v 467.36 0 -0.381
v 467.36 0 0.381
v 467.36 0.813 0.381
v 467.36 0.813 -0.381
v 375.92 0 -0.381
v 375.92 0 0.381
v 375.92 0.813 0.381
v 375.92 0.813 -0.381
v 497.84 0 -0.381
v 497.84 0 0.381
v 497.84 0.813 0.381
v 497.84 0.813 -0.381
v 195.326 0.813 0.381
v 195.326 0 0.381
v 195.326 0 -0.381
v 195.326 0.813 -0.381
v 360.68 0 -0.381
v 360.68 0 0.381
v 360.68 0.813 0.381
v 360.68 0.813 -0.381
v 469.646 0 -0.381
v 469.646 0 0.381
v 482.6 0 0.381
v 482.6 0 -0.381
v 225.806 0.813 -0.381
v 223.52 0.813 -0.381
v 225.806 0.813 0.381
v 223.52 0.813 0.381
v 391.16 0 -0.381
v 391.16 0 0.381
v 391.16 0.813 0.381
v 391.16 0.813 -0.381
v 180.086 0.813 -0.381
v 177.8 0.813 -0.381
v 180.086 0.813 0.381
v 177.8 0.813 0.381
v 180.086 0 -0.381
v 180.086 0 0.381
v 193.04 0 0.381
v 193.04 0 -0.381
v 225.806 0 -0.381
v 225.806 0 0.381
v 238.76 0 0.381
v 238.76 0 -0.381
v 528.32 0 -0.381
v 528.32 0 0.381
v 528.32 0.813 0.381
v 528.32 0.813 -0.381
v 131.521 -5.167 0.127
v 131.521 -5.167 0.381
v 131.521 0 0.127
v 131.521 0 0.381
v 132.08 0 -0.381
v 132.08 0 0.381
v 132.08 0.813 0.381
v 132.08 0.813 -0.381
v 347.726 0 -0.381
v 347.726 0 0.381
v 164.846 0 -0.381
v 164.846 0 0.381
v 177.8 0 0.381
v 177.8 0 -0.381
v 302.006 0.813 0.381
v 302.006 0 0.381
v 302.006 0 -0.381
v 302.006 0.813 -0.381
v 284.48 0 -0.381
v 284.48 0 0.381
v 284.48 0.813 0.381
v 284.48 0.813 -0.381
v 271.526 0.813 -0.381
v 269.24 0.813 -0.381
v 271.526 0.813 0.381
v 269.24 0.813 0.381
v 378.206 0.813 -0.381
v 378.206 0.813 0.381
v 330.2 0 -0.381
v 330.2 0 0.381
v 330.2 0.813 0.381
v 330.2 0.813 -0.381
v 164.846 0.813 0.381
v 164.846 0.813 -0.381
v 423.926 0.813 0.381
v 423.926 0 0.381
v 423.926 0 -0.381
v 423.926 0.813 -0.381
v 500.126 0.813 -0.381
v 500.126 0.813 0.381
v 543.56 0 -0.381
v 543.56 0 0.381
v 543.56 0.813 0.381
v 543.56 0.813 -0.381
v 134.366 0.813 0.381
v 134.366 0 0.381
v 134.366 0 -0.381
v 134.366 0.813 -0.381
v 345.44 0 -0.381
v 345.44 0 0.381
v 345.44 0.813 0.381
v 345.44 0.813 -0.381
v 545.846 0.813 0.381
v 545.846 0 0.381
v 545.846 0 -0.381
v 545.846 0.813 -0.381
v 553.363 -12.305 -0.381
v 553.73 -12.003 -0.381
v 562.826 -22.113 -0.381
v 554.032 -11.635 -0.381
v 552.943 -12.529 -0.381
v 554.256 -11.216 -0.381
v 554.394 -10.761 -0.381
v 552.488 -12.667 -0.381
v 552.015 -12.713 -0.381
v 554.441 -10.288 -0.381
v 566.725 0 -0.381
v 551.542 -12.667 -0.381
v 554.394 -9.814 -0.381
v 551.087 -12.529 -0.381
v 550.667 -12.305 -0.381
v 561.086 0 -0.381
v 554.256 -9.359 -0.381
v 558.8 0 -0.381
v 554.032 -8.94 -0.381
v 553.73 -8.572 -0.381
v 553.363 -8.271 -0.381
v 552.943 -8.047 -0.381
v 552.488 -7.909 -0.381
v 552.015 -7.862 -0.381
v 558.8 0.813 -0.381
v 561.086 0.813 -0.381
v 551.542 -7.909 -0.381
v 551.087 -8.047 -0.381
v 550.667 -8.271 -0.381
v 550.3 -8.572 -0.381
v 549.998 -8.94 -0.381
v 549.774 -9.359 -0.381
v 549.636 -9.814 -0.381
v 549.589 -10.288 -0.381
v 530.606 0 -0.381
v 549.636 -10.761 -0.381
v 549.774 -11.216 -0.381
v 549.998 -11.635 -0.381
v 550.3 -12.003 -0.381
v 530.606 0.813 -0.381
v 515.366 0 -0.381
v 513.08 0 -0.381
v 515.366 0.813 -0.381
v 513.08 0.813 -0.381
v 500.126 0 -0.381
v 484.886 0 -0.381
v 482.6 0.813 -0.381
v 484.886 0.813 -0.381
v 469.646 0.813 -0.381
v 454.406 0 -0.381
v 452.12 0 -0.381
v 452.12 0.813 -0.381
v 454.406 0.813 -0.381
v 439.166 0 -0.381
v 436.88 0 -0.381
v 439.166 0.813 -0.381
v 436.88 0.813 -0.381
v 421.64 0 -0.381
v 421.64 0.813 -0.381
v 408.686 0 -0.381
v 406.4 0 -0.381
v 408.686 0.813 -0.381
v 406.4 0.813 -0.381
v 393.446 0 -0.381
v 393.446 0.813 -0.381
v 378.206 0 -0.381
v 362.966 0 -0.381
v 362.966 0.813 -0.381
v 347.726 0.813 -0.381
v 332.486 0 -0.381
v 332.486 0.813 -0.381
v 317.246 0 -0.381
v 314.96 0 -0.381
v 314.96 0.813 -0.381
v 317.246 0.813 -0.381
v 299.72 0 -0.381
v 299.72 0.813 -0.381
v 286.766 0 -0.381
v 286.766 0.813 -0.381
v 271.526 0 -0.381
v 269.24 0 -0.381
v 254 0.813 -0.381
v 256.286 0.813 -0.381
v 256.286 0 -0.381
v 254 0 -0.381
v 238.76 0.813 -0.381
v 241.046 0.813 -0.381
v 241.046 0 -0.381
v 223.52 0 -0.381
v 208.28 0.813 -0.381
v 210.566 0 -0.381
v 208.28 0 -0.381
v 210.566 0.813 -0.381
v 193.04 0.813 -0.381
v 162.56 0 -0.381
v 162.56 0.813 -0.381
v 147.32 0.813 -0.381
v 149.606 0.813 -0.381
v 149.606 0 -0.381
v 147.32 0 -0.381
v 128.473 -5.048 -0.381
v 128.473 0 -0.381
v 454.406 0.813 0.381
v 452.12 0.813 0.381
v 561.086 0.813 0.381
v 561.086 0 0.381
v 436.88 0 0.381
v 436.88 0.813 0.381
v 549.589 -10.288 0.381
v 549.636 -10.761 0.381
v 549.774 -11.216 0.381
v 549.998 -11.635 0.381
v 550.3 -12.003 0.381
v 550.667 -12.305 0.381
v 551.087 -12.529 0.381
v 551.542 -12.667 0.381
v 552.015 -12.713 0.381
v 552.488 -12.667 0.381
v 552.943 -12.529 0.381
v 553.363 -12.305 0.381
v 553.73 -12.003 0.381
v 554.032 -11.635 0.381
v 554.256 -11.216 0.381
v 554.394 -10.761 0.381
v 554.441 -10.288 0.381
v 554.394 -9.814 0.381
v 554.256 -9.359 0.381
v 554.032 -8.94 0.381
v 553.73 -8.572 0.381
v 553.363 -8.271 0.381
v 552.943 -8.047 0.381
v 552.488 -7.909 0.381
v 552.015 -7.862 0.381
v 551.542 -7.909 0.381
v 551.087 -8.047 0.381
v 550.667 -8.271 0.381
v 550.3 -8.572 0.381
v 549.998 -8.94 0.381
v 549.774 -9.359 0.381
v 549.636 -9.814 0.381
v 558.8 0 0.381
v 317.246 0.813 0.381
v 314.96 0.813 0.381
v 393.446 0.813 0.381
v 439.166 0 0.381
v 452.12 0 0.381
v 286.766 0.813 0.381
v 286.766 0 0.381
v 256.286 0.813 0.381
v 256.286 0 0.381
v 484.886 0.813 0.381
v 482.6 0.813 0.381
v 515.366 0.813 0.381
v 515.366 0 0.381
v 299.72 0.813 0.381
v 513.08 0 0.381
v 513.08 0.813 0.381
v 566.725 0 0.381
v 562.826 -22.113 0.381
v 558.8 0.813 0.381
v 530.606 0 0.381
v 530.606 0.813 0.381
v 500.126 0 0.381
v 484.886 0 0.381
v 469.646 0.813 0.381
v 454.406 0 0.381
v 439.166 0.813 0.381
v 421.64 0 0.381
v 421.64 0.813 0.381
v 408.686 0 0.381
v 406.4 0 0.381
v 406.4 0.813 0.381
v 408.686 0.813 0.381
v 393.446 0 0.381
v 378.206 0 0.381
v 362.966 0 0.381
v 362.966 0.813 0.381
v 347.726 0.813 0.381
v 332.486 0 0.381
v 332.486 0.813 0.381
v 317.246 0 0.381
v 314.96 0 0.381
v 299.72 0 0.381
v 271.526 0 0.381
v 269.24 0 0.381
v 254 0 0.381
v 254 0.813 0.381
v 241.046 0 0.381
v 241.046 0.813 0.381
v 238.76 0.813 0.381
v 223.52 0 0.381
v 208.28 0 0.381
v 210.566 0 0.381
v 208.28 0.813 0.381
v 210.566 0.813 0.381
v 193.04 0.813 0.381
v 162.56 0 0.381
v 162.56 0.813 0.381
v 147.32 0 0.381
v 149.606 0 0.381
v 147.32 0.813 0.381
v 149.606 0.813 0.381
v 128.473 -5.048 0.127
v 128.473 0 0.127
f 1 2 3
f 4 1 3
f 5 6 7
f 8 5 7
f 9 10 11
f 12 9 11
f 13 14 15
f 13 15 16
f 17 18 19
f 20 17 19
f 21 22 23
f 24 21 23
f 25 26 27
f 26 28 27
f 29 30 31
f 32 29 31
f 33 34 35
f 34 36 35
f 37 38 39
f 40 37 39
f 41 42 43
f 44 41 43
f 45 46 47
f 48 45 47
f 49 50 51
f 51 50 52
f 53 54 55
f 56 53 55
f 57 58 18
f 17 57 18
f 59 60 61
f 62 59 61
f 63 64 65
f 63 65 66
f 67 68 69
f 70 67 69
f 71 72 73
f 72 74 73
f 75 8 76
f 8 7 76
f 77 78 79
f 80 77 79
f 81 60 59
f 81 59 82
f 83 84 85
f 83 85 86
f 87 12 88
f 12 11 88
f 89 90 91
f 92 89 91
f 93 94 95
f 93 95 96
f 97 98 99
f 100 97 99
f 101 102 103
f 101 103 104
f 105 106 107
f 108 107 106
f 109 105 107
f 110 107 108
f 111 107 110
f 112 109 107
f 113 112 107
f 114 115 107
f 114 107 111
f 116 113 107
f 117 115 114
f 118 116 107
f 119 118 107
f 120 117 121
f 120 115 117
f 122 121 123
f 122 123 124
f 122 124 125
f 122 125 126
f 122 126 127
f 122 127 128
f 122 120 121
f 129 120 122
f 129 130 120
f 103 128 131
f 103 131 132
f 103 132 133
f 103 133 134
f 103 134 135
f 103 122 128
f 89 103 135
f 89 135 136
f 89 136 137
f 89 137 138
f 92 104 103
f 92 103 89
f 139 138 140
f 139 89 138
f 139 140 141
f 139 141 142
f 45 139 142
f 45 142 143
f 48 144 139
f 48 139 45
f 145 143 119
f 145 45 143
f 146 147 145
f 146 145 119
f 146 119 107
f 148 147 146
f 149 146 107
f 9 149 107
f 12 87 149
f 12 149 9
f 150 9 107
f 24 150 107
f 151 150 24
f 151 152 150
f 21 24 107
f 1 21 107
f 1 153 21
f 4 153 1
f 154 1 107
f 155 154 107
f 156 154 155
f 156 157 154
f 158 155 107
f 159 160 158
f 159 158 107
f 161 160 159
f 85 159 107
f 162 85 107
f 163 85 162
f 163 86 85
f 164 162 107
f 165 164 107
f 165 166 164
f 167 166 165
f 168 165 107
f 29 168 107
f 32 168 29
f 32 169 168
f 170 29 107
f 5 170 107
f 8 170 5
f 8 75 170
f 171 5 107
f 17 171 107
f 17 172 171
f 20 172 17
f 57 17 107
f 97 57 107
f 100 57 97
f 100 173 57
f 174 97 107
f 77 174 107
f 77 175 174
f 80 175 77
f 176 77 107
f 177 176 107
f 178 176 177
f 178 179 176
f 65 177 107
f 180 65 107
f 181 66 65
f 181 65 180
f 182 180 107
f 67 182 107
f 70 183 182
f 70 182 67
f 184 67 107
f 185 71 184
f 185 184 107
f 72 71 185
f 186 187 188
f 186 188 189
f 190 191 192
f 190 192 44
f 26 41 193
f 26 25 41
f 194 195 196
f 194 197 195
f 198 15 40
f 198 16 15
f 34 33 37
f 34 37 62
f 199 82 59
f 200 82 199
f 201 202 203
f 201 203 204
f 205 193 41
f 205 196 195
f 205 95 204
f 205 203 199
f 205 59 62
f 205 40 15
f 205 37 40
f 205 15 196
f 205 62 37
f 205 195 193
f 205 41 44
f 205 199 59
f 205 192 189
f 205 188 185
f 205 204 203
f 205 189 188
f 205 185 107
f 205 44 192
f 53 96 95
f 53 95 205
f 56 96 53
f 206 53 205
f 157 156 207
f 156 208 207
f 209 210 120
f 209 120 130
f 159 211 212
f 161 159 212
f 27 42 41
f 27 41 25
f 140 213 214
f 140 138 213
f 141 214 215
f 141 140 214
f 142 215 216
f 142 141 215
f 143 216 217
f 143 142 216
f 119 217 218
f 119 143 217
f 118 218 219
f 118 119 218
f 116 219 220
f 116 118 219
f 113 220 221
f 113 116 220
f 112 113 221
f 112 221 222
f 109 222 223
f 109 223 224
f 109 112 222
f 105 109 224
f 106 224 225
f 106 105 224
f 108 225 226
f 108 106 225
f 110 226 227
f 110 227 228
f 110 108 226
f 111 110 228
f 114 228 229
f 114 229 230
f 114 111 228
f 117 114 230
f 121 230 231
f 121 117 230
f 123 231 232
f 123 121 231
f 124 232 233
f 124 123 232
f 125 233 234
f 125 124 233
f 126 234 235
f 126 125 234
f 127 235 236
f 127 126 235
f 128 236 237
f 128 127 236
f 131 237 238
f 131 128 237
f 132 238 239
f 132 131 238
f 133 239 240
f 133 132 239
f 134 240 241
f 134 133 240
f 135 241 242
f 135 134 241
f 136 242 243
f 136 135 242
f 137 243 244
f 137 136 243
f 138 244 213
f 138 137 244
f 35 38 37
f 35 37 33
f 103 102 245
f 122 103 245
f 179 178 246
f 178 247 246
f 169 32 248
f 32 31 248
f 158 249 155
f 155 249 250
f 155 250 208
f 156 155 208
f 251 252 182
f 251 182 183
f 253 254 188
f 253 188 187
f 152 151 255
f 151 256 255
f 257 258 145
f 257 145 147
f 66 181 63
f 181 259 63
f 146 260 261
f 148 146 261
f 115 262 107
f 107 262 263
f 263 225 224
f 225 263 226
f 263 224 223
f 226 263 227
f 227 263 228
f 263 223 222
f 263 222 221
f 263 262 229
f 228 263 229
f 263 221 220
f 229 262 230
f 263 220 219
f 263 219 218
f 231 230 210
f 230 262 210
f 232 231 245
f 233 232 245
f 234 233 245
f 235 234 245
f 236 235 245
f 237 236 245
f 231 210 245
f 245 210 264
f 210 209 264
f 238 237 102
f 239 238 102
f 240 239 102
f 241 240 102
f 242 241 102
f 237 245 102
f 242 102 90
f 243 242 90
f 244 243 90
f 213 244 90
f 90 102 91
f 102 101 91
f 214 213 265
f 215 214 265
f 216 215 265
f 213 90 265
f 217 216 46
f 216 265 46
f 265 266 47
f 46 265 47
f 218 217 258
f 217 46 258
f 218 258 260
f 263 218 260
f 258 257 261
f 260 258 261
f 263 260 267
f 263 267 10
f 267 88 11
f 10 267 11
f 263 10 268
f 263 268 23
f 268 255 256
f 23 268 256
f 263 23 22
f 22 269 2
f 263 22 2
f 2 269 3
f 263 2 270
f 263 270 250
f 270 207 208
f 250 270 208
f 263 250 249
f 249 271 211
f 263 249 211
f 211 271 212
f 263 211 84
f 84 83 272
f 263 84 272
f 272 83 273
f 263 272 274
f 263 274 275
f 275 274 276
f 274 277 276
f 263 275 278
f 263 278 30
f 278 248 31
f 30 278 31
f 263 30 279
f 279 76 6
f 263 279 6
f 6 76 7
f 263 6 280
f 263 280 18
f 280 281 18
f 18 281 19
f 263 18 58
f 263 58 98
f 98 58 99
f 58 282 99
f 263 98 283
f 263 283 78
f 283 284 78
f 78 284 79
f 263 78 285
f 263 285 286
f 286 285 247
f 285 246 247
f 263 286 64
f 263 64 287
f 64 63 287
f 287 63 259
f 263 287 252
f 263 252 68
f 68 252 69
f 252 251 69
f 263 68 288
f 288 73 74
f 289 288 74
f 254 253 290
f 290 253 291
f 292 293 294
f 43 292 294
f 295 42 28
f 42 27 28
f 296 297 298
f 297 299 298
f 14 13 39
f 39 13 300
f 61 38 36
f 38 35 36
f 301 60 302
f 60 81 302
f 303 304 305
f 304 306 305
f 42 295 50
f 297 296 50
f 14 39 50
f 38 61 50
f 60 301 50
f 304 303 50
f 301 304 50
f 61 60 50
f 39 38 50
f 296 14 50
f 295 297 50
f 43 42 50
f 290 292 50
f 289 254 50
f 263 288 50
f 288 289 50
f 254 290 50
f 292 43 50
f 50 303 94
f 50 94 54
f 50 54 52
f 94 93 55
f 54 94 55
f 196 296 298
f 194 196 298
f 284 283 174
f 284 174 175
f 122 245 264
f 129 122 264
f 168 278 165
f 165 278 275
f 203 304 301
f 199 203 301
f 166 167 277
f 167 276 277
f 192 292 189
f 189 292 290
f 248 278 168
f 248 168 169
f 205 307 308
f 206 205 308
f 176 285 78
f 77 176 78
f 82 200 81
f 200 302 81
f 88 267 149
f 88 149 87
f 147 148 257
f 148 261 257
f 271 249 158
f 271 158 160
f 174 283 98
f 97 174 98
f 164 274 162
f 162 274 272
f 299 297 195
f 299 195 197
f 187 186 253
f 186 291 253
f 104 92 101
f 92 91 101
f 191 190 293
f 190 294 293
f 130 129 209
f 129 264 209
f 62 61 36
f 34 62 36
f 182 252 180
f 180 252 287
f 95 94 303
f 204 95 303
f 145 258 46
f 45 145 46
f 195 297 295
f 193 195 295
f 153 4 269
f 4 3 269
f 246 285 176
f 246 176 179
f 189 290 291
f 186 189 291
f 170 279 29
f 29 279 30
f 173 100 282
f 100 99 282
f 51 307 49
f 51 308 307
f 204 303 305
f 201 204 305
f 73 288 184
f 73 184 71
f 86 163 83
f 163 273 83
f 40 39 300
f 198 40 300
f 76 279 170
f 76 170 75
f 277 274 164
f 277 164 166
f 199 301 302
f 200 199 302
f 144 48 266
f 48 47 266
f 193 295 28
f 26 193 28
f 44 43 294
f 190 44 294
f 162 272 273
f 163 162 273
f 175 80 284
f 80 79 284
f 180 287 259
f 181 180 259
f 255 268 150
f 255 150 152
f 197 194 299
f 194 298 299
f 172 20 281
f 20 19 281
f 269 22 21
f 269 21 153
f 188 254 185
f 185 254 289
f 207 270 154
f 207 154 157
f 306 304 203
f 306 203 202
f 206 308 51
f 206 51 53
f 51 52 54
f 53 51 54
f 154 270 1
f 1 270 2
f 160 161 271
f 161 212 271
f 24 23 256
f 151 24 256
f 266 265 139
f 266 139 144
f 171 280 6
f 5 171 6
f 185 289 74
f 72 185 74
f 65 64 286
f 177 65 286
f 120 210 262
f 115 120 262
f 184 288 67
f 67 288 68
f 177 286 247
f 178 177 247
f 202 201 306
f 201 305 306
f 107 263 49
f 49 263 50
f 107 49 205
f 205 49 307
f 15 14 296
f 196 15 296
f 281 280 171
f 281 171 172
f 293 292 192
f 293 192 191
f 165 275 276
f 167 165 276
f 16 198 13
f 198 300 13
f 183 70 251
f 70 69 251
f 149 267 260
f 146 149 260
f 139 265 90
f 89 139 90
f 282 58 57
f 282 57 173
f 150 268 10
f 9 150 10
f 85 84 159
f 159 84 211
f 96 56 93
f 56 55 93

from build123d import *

# Parameters (mm, degrees)
SKETCH1_R                      = 2.4257
EXTRUDE1_DEPTH                 = 0.381
SKETCH2_W                      = 2.286
SKETCH2_H                      = 1.0668
EB_02_TAB_1_DEPTH              = 0.381
LP_01_TAB_1_X_29_X_0_600_COUNT = 29
LP_01_TAB_1_X_29_X_0_600_PITCH = 15.24
SKETCH5_W                      = 6.469789446
SKETCH5_H                      = 8.753244544
EXTRUDE5_DEPTH                 = 0.254


with BuildPart() as part:
    # Sketch1 → Extrude1 (new, symmetric)
    with BuildSketch(Plane.XY):
        Polygon((128.4732, 0), (566.7248, 0), (562.825597202, -22.113477941), (128.4732, -5.047725776), align=None)
        with Locations((552.014887855, -10.287672178)):
            Circle(SKETCH1_R, mode=Mode.SUBTRACT)
    extrude(amount=EXTRUDE1_DEPTH, both=True)

    # Sketch2 → EB-02 Tab 1 (add, symmetric)
    with BuildSketch(Plane.XY):
        with Locations((133.223, 0.2794)):
            Rectangle(SKETCH2_W, SKETCH2_H)
    eb_02_tab_1 = extrude(amount=EB_02_TAB_1_DEPTH, both=True)

    # LP-01 Tab 1 x 29 x 0.600: EB-02 Tab 1 ×29
    with Locations(*[(i * LP_01_TAB_1_X_29_X_0_600_PITCH, 0, 0) for i in range(1, LP_01_TAB_1_X_29_X_0_600_COUNT)]):
        add(eb_02_tab_1)

    # Sketch5 → Extrude5 (cut)
    with BuildSketch(Plane.XY.offset(0.381)):
        with Locations((128.286305277, -2.289052867)):
            Rectangle(SKETCH5_W, SKETCH5_H)
    extrude(amount=-EXTRUDE5_DEPTH, mode=Mode.SUBTRACT)


solid = part.part
